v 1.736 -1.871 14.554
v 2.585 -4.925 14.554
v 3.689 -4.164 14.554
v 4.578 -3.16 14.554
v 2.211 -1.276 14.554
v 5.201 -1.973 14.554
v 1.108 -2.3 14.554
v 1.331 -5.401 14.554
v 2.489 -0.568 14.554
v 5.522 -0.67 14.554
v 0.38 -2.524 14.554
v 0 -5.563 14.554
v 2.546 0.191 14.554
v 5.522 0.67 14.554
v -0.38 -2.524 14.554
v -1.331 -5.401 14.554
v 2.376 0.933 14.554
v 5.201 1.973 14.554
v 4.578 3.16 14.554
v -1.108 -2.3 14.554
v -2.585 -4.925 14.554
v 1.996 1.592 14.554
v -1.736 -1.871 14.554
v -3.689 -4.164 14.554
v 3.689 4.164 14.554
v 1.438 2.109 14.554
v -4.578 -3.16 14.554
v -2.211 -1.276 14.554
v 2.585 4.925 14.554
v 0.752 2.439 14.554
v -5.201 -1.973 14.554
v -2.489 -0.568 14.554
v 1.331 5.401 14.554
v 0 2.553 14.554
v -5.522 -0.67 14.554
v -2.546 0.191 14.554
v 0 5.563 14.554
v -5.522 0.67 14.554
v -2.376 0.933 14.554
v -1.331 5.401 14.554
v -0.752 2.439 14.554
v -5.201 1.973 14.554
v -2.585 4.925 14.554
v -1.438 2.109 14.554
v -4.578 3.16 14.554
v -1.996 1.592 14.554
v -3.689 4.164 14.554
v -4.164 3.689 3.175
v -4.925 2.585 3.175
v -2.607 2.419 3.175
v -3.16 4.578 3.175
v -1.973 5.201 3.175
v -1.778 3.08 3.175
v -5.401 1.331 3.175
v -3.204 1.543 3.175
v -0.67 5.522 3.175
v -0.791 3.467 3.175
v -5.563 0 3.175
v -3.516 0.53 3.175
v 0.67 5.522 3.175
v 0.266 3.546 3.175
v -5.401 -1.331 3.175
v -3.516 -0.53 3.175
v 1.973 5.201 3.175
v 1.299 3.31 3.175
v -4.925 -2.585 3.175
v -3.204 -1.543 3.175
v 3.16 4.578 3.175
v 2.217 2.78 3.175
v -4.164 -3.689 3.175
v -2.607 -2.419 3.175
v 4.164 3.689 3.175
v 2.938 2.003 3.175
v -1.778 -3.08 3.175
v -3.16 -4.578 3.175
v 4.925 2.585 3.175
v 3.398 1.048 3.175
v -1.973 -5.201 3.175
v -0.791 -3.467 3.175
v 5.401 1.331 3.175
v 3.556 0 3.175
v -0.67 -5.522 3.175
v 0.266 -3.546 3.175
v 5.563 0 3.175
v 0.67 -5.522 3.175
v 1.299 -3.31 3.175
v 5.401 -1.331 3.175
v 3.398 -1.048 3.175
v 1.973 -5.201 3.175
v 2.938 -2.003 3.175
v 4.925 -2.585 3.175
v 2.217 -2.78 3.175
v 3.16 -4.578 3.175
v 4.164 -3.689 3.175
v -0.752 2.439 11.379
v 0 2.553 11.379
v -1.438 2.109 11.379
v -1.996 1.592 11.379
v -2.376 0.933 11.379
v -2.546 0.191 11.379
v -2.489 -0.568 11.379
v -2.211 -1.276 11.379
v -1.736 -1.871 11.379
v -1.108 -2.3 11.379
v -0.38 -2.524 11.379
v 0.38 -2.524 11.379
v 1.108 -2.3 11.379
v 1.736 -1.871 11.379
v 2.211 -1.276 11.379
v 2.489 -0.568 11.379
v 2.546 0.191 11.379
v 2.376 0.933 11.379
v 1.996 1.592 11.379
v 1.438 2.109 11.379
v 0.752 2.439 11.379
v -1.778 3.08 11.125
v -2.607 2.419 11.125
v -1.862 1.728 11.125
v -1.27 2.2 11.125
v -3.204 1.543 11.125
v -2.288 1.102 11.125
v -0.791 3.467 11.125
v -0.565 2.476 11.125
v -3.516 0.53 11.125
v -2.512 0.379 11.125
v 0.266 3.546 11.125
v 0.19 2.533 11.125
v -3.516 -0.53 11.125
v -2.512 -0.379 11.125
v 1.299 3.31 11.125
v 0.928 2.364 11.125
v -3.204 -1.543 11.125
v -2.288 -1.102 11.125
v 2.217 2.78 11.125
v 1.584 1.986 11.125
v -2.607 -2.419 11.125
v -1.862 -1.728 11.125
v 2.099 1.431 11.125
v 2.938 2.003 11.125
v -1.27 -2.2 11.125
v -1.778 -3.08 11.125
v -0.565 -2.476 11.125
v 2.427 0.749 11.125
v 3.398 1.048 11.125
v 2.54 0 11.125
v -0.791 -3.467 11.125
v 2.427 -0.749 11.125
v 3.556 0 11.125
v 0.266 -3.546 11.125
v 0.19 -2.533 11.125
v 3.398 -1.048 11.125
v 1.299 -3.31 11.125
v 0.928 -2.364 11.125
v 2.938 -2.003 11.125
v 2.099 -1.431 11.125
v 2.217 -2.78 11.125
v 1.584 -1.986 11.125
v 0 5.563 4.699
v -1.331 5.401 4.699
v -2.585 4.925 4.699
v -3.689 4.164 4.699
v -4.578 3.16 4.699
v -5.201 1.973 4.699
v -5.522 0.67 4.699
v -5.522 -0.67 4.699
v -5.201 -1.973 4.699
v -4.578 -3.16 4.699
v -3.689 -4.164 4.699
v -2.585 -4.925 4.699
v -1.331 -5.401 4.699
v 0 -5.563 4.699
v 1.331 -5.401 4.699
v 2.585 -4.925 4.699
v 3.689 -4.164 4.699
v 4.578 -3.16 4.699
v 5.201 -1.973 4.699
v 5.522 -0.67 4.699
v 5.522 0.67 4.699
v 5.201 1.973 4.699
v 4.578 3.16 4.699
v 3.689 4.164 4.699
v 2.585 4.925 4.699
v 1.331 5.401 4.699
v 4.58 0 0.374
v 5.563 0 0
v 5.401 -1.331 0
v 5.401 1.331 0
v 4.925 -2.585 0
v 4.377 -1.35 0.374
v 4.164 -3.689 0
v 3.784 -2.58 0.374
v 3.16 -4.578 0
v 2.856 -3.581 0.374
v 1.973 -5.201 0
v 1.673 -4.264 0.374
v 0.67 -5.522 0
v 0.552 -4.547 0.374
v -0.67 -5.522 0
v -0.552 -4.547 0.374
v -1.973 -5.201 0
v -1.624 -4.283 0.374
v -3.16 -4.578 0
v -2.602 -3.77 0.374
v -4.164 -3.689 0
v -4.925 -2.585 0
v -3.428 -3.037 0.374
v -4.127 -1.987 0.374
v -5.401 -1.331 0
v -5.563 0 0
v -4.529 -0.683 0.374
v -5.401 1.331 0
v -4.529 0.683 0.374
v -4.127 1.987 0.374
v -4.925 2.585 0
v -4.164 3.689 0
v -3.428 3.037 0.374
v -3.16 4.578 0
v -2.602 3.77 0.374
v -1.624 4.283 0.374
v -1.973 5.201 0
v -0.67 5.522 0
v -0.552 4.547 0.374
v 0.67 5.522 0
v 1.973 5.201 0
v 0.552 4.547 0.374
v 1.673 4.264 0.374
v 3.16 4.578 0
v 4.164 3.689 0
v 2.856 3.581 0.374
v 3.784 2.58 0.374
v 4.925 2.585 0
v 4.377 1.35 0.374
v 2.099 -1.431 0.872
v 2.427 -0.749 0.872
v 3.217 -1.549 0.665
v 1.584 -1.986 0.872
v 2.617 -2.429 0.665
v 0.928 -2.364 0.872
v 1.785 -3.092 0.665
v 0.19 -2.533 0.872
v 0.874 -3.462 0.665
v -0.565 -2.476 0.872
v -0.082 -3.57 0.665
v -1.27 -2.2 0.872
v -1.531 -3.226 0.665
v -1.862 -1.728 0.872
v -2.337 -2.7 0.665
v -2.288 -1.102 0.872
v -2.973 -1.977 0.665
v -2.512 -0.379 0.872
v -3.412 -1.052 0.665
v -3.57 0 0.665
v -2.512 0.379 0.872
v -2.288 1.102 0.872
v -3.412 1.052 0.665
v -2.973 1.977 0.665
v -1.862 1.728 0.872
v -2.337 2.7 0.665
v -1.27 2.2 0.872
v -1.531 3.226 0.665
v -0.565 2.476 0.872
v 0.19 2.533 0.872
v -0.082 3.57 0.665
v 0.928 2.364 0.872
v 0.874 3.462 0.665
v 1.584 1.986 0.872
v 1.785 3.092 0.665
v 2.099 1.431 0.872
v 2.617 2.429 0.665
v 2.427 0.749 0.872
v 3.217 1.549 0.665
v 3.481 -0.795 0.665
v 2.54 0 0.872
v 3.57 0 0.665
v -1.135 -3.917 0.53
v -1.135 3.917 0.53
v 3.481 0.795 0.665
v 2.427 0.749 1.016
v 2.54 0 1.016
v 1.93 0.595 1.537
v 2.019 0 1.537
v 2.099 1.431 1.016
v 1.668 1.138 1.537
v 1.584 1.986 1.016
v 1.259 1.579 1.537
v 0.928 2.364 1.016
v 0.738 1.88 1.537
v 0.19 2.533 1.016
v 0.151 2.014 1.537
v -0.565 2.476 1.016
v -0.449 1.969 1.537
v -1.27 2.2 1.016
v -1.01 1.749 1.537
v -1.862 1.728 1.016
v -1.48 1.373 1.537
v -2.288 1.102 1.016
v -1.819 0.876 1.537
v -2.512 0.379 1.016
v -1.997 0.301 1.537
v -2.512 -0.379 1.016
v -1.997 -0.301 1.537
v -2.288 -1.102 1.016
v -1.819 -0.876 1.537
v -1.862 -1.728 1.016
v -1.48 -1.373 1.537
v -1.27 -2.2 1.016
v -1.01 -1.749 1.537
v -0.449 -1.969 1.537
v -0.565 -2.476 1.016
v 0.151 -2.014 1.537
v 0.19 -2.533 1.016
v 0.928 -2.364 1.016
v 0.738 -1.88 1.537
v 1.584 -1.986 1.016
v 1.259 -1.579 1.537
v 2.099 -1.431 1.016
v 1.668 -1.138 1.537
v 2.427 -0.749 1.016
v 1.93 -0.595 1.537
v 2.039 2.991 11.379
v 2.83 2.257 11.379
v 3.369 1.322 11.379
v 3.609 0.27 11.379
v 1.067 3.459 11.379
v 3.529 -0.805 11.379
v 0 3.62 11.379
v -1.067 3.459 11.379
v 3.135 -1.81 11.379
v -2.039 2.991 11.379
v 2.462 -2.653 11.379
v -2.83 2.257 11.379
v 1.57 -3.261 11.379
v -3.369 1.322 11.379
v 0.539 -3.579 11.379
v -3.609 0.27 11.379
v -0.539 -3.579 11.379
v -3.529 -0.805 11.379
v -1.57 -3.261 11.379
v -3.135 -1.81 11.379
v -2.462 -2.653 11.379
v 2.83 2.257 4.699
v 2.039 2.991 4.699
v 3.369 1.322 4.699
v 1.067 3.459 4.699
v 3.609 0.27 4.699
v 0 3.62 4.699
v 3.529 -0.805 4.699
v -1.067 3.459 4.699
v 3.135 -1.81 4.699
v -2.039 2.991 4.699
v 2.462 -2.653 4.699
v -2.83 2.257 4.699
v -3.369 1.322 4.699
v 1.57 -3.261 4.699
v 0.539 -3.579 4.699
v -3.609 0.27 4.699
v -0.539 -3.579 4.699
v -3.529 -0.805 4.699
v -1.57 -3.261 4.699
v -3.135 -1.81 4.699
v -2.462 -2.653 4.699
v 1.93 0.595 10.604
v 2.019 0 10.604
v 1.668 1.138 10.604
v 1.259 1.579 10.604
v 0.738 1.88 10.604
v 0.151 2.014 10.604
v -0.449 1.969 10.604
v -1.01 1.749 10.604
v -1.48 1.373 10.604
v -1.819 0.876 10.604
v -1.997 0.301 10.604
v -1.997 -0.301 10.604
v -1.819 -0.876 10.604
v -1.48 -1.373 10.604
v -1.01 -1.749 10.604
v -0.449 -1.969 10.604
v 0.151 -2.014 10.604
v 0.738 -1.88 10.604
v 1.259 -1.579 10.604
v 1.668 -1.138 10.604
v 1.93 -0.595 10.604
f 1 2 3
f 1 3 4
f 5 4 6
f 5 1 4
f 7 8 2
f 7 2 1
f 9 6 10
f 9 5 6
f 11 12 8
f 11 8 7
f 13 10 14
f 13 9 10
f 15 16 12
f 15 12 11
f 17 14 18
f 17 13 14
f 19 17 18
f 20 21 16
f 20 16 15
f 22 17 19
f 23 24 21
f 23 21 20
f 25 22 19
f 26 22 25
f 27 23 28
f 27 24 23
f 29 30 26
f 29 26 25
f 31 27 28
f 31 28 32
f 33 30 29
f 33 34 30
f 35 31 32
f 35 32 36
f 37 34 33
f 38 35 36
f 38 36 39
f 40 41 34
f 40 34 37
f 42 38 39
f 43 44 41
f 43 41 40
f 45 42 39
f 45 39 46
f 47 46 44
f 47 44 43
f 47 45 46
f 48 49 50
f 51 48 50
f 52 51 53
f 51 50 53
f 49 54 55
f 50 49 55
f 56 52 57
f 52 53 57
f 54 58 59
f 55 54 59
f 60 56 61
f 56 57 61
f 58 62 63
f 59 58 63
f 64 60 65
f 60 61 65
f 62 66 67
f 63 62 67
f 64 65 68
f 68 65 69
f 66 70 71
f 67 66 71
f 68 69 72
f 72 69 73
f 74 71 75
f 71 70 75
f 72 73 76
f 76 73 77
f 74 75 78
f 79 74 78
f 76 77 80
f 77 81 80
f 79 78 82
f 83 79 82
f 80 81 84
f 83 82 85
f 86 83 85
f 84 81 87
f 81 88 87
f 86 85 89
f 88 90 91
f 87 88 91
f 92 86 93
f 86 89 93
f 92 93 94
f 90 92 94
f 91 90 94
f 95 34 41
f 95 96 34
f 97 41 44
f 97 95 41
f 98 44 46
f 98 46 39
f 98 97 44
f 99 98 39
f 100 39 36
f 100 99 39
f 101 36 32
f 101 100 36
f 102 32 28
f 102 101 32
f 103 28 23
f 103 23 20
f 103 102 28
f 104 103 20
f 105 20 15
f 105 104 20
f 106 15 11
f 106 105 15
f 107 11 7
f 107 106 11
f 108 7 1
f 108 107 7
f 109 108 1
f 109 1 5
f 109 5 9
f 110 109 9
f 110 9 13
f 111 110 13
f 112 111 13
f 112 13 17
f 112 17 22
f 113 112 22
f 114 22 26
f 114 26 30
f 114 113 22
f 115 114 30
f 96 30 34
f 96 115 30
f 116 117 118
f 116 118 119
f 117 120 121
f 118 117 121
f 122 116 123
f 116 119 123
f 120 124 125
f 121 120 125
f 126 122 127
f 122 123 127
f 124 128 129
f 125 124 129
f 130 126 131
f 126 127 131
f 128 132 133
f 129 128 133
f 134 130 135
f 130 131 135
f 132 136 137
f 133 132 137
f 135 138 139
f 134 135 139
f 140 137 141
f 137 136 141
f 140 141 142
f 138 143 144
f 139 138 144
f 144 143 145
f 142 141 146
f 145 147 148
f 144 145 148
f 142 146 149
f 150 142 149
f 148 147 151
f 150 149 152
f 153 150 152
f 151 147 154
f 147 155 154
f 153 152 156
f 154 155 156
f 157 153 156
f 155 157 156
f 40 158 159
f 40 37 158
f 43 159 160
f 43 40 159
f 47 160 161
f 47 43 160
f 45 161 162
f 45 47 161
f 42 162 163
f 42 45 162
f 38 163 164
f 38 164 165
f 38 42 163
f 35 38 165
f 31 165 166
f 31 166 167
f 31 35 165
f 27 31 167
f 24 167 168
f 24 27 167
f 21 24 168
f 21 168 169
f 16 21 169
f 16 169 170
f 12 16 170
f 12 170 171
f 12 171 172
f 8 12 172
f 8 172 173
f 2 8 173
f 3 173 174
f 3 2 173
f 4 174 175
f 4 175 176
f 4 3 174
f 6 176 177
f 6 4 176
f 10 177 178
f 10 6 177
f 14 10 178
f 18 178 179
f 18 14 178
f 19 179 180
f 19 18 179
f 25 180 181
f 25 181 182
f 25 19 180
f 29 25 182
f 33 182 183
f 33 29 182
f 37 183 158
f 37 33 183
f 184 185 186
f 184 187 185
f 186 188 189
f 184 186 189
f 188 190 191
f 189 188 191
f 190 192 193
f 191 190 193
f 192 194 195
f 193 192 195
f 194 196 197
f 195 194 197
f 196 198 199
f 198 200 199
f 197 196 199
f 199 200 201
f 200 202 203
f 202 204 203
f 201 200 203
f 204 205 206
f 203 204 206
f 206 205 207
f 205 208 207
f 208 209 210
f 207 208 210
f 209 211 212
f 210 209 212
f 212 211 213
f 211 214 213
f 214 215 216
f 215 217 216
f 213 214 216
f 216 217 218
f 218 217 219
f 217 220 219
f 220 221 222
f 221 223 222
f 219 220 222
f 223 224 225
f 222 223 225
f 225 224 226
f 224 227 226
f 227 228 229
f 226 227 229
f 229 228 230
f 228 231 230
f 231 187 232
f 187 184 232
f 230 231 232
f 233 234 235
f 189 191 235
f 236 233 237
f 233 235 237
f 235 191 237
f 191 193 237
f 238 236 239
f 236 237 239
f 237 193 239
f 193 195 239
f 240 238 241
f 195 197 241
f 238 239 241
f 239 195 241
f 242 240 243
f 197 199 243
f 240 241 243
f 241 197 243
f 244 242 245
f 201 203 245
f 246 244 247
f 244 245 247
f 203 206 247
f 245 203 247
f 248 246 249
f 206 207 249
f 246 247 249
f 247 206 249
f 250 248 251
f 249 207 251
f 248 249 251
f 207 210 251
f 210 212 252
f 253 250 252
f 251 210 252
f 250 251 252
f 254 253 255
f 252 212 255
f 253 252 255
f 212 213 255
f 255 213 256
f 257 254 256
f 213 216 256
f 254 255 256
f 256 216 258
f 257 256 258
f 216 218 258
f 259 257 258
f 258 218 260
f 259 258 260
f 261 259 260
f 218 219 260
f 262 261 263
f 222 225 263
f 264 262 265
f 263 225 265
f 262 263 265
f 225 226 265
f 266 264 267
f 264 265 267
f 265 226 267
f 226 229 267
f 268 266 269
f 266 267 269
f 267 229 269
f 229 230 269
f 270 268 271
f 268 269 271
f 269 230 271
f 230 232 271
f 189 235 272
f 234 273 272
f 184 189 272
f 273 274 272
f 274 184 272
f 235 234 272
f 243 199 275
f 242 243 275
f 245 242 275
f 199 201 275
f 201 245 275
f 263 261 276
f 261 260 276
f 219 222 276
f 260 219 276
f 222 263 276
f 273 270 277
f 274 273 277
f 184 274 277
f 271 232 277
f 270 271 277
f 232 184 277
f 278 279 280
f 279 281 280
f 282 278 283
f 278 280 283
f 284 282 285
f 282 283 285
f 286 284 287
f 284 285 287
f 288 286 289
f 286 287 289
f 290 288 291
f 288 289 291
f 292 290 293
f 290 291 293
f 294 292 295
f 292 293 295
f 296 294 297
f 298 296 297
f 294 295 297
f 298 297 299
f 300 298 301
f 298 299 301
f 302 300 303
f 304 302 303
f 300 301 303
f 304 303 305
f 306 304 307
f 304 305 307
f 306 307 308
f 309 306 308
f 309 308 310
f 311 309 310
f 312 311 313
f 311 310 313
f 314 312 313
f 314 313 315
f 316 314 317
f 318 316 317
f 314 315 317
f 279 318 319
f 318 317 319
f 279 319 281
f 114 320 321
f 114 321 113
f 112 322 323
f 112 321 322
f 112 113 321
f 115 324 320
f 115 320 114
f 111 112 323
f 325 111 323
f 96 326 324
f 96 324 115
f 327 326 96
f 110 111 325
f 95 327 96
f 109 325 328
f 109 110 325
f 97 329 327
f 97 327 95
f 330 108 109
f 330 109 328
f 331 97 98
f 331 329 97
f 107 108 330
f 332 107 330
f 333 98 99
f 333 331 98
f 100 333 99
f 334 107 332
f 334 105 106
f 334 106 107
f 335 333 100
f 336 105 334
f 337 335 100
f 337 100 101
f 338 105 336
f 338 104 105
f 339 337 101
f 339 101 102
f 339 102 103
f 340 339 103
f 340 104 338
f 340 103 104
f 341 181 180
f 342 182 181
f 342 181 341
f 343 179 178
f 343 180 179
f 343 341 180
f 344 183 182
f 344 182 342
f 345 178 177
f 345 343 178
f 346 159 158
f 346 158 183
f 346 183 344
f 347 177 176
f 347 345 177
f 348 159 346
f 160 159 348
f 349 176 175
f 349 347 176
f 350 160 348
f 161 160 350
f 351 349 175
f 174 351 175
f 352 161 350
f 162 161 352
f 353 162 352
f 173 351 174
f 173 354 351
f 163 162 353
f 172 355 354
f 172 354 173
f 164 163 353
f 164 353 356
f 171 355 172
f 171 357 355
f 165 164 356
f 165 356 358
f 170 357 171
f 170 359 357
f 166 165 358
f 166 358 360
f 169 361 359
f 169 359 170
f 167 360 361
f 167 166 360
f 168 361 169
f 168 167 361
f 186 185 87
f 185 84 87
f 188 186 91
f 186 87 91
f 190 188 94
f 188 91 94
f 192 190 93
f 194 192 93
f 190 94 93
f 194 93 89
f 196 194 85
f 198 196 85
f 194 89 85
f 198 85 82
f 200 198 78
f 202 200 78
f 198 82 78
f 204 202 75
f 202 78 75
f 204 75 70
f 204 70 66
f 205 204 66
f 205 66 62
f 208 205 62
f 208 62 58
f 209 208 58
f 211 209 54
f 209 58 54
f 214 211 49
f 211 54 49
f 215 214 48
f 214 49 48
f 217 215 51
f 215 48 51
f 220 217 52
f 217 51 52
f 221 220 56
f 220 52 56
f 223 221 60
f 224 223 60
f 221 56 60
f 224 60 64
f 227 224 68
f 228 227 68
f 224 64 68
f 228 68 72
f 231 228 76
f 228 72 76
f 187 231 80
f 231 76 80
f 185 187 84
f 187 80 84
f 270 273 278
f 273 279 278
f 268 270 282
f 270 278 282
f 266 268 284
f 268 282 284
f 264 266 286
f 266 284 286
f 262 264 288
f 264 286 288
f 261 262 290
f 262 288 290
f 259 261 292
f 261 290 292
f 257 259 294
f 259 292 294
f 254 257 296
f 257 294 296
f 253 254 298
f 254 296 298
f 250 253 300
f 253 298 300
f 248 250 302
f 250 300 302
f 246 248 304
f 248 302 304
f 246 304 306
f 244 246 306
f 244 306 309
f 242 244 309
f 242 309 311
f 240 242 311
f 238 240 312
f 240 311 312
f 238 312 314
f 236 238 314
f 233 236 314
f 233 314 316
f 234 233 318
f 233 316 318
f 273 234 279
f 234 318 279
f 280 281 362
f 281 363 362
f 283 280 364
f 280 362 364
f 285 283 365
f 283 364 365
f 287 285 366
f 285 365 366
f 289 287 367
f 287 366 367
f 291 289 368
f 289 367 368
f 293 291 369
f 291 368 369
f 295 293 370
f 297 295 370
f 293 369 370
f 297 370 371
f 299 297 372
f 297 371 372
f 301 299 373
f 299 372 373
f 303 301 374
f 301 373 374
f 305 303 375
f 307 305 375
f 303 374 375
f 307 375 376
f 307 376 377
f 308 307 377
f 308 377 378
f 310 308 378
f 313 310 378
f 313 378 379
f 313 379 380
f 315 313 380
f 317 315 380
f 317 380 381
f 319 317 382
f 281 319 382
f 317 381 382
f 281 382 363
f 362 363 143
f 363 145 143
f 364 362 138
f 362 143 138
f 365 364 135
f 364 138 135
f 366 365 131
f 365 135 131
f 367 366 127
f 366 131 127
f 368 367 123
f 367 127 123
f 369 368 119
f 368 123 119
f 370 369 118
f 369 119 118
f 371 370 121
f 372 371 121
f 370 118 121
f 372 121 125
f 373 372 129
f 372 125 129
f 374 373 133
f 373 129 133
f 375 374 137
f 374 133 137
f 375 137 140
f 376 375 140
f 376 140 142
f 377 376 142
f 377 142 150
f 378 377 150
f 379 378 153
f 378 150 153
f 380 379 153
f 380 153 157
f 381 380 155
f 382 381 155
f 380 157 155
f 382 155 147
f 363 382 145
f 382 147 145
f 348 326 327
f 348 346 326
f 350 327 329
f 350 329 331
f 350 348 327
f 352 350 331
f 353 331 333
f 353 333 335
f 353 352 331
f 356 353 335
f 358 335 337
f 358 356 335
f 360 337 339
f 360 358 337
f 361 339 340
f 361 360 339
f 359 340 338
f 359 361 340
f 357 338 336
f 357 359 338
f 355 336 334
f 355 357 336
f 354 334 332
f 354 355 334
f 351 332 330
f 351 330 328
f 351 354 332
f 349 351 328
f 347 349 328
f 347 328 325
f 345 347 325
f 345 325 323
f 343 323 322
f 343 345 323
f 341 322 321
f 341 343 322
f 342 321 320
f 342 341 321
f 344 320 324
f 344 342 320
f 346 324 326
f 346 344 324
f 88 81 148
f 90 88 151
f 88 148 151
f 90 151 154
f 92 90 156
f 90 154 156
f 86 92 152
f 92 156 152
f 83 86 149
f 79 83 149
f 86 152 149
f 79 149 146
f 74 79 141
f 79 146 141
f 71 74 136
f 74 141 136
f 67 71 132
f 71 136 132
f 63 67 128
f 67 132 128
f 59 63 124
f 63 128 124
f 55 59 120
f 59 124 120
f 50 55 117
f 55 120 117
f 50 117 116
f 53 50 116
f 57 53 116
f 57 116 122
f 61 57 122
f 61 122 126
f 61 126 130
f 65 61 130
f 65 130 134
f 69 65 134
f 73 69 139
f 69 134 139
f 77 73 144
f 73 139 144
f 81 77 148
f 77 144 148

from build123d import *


# Read off the part's stored shape, not the designer's step: #10-32 Tapped Hole1
with BuildPart() as part:
    # Sketch1 → Revolve1 (revolve)
    with BuildSketch(Plane(origin=(0, 0, 0), x_dir=(0, 0, -1), z_dir=(1, 0, 0)), mode=Mode.PRIVATE) as revolve1_sk:
        with BuildLine():
            Line((0, 5.5626), (-3.175, 5.5626))
            Line((-3.175, 5.5626), (-3.175, 3.556))
            Line((-3.175, 3.556), (-11.1252, 3.556))
            Line((-11.1252, 3.556), (-11.1252, 0))
            Line((-11.1252, 0), (-1.016, 0))
            ThreePointArc((-1.016, 0), (-0.821524687, 2.838564783), (0, 5.5626))
        make_face()
    revolve(revolve1_sk.sketch.rotate(Axis((0, 0, -3.095973099), (0, 0, -1)), 90), axis=Axis((0, 0, -3.095973099), (0, 0, -1)))

    # #10-32 Tapped Hole1 outline → #10-32 Tapped Hole1 (revolve, cut)
    with BuildSketch(Plane.XZ):
        Polygon((0, 0.872385993), (2.54, 0.872385993), (2.54, 1.016), (2.0193, 1.5367), (2.0193, 10.6045), (2.54, 11.1252), (0, 11.1252), align=None)
    revolve(axis=Axis((0, 0, 0), (0, 0, 1)), mode=Mode.SUBTRACT)


with BuildPart() as body_2:
    # Sketch4 → Revolve2 (revolve)
    with BuildSketch(Plane(origin=(0, 0, 0), x_dir=(0, 0, -1), z_dir=(1, 0, 0))):
        Polygon((-4.699, 3.6195), (-4.699, 5.5626), (-14.5542, 5.5626), (-14.5542, 2.5527), (-11.3792, 2.5527), (-11.3792, 3.6195), align=None)
    revolve(axis=Axis((0, 0, 18.738609771), (0, 0, 1)))


solid = Compound([part.part, body_2.part])
